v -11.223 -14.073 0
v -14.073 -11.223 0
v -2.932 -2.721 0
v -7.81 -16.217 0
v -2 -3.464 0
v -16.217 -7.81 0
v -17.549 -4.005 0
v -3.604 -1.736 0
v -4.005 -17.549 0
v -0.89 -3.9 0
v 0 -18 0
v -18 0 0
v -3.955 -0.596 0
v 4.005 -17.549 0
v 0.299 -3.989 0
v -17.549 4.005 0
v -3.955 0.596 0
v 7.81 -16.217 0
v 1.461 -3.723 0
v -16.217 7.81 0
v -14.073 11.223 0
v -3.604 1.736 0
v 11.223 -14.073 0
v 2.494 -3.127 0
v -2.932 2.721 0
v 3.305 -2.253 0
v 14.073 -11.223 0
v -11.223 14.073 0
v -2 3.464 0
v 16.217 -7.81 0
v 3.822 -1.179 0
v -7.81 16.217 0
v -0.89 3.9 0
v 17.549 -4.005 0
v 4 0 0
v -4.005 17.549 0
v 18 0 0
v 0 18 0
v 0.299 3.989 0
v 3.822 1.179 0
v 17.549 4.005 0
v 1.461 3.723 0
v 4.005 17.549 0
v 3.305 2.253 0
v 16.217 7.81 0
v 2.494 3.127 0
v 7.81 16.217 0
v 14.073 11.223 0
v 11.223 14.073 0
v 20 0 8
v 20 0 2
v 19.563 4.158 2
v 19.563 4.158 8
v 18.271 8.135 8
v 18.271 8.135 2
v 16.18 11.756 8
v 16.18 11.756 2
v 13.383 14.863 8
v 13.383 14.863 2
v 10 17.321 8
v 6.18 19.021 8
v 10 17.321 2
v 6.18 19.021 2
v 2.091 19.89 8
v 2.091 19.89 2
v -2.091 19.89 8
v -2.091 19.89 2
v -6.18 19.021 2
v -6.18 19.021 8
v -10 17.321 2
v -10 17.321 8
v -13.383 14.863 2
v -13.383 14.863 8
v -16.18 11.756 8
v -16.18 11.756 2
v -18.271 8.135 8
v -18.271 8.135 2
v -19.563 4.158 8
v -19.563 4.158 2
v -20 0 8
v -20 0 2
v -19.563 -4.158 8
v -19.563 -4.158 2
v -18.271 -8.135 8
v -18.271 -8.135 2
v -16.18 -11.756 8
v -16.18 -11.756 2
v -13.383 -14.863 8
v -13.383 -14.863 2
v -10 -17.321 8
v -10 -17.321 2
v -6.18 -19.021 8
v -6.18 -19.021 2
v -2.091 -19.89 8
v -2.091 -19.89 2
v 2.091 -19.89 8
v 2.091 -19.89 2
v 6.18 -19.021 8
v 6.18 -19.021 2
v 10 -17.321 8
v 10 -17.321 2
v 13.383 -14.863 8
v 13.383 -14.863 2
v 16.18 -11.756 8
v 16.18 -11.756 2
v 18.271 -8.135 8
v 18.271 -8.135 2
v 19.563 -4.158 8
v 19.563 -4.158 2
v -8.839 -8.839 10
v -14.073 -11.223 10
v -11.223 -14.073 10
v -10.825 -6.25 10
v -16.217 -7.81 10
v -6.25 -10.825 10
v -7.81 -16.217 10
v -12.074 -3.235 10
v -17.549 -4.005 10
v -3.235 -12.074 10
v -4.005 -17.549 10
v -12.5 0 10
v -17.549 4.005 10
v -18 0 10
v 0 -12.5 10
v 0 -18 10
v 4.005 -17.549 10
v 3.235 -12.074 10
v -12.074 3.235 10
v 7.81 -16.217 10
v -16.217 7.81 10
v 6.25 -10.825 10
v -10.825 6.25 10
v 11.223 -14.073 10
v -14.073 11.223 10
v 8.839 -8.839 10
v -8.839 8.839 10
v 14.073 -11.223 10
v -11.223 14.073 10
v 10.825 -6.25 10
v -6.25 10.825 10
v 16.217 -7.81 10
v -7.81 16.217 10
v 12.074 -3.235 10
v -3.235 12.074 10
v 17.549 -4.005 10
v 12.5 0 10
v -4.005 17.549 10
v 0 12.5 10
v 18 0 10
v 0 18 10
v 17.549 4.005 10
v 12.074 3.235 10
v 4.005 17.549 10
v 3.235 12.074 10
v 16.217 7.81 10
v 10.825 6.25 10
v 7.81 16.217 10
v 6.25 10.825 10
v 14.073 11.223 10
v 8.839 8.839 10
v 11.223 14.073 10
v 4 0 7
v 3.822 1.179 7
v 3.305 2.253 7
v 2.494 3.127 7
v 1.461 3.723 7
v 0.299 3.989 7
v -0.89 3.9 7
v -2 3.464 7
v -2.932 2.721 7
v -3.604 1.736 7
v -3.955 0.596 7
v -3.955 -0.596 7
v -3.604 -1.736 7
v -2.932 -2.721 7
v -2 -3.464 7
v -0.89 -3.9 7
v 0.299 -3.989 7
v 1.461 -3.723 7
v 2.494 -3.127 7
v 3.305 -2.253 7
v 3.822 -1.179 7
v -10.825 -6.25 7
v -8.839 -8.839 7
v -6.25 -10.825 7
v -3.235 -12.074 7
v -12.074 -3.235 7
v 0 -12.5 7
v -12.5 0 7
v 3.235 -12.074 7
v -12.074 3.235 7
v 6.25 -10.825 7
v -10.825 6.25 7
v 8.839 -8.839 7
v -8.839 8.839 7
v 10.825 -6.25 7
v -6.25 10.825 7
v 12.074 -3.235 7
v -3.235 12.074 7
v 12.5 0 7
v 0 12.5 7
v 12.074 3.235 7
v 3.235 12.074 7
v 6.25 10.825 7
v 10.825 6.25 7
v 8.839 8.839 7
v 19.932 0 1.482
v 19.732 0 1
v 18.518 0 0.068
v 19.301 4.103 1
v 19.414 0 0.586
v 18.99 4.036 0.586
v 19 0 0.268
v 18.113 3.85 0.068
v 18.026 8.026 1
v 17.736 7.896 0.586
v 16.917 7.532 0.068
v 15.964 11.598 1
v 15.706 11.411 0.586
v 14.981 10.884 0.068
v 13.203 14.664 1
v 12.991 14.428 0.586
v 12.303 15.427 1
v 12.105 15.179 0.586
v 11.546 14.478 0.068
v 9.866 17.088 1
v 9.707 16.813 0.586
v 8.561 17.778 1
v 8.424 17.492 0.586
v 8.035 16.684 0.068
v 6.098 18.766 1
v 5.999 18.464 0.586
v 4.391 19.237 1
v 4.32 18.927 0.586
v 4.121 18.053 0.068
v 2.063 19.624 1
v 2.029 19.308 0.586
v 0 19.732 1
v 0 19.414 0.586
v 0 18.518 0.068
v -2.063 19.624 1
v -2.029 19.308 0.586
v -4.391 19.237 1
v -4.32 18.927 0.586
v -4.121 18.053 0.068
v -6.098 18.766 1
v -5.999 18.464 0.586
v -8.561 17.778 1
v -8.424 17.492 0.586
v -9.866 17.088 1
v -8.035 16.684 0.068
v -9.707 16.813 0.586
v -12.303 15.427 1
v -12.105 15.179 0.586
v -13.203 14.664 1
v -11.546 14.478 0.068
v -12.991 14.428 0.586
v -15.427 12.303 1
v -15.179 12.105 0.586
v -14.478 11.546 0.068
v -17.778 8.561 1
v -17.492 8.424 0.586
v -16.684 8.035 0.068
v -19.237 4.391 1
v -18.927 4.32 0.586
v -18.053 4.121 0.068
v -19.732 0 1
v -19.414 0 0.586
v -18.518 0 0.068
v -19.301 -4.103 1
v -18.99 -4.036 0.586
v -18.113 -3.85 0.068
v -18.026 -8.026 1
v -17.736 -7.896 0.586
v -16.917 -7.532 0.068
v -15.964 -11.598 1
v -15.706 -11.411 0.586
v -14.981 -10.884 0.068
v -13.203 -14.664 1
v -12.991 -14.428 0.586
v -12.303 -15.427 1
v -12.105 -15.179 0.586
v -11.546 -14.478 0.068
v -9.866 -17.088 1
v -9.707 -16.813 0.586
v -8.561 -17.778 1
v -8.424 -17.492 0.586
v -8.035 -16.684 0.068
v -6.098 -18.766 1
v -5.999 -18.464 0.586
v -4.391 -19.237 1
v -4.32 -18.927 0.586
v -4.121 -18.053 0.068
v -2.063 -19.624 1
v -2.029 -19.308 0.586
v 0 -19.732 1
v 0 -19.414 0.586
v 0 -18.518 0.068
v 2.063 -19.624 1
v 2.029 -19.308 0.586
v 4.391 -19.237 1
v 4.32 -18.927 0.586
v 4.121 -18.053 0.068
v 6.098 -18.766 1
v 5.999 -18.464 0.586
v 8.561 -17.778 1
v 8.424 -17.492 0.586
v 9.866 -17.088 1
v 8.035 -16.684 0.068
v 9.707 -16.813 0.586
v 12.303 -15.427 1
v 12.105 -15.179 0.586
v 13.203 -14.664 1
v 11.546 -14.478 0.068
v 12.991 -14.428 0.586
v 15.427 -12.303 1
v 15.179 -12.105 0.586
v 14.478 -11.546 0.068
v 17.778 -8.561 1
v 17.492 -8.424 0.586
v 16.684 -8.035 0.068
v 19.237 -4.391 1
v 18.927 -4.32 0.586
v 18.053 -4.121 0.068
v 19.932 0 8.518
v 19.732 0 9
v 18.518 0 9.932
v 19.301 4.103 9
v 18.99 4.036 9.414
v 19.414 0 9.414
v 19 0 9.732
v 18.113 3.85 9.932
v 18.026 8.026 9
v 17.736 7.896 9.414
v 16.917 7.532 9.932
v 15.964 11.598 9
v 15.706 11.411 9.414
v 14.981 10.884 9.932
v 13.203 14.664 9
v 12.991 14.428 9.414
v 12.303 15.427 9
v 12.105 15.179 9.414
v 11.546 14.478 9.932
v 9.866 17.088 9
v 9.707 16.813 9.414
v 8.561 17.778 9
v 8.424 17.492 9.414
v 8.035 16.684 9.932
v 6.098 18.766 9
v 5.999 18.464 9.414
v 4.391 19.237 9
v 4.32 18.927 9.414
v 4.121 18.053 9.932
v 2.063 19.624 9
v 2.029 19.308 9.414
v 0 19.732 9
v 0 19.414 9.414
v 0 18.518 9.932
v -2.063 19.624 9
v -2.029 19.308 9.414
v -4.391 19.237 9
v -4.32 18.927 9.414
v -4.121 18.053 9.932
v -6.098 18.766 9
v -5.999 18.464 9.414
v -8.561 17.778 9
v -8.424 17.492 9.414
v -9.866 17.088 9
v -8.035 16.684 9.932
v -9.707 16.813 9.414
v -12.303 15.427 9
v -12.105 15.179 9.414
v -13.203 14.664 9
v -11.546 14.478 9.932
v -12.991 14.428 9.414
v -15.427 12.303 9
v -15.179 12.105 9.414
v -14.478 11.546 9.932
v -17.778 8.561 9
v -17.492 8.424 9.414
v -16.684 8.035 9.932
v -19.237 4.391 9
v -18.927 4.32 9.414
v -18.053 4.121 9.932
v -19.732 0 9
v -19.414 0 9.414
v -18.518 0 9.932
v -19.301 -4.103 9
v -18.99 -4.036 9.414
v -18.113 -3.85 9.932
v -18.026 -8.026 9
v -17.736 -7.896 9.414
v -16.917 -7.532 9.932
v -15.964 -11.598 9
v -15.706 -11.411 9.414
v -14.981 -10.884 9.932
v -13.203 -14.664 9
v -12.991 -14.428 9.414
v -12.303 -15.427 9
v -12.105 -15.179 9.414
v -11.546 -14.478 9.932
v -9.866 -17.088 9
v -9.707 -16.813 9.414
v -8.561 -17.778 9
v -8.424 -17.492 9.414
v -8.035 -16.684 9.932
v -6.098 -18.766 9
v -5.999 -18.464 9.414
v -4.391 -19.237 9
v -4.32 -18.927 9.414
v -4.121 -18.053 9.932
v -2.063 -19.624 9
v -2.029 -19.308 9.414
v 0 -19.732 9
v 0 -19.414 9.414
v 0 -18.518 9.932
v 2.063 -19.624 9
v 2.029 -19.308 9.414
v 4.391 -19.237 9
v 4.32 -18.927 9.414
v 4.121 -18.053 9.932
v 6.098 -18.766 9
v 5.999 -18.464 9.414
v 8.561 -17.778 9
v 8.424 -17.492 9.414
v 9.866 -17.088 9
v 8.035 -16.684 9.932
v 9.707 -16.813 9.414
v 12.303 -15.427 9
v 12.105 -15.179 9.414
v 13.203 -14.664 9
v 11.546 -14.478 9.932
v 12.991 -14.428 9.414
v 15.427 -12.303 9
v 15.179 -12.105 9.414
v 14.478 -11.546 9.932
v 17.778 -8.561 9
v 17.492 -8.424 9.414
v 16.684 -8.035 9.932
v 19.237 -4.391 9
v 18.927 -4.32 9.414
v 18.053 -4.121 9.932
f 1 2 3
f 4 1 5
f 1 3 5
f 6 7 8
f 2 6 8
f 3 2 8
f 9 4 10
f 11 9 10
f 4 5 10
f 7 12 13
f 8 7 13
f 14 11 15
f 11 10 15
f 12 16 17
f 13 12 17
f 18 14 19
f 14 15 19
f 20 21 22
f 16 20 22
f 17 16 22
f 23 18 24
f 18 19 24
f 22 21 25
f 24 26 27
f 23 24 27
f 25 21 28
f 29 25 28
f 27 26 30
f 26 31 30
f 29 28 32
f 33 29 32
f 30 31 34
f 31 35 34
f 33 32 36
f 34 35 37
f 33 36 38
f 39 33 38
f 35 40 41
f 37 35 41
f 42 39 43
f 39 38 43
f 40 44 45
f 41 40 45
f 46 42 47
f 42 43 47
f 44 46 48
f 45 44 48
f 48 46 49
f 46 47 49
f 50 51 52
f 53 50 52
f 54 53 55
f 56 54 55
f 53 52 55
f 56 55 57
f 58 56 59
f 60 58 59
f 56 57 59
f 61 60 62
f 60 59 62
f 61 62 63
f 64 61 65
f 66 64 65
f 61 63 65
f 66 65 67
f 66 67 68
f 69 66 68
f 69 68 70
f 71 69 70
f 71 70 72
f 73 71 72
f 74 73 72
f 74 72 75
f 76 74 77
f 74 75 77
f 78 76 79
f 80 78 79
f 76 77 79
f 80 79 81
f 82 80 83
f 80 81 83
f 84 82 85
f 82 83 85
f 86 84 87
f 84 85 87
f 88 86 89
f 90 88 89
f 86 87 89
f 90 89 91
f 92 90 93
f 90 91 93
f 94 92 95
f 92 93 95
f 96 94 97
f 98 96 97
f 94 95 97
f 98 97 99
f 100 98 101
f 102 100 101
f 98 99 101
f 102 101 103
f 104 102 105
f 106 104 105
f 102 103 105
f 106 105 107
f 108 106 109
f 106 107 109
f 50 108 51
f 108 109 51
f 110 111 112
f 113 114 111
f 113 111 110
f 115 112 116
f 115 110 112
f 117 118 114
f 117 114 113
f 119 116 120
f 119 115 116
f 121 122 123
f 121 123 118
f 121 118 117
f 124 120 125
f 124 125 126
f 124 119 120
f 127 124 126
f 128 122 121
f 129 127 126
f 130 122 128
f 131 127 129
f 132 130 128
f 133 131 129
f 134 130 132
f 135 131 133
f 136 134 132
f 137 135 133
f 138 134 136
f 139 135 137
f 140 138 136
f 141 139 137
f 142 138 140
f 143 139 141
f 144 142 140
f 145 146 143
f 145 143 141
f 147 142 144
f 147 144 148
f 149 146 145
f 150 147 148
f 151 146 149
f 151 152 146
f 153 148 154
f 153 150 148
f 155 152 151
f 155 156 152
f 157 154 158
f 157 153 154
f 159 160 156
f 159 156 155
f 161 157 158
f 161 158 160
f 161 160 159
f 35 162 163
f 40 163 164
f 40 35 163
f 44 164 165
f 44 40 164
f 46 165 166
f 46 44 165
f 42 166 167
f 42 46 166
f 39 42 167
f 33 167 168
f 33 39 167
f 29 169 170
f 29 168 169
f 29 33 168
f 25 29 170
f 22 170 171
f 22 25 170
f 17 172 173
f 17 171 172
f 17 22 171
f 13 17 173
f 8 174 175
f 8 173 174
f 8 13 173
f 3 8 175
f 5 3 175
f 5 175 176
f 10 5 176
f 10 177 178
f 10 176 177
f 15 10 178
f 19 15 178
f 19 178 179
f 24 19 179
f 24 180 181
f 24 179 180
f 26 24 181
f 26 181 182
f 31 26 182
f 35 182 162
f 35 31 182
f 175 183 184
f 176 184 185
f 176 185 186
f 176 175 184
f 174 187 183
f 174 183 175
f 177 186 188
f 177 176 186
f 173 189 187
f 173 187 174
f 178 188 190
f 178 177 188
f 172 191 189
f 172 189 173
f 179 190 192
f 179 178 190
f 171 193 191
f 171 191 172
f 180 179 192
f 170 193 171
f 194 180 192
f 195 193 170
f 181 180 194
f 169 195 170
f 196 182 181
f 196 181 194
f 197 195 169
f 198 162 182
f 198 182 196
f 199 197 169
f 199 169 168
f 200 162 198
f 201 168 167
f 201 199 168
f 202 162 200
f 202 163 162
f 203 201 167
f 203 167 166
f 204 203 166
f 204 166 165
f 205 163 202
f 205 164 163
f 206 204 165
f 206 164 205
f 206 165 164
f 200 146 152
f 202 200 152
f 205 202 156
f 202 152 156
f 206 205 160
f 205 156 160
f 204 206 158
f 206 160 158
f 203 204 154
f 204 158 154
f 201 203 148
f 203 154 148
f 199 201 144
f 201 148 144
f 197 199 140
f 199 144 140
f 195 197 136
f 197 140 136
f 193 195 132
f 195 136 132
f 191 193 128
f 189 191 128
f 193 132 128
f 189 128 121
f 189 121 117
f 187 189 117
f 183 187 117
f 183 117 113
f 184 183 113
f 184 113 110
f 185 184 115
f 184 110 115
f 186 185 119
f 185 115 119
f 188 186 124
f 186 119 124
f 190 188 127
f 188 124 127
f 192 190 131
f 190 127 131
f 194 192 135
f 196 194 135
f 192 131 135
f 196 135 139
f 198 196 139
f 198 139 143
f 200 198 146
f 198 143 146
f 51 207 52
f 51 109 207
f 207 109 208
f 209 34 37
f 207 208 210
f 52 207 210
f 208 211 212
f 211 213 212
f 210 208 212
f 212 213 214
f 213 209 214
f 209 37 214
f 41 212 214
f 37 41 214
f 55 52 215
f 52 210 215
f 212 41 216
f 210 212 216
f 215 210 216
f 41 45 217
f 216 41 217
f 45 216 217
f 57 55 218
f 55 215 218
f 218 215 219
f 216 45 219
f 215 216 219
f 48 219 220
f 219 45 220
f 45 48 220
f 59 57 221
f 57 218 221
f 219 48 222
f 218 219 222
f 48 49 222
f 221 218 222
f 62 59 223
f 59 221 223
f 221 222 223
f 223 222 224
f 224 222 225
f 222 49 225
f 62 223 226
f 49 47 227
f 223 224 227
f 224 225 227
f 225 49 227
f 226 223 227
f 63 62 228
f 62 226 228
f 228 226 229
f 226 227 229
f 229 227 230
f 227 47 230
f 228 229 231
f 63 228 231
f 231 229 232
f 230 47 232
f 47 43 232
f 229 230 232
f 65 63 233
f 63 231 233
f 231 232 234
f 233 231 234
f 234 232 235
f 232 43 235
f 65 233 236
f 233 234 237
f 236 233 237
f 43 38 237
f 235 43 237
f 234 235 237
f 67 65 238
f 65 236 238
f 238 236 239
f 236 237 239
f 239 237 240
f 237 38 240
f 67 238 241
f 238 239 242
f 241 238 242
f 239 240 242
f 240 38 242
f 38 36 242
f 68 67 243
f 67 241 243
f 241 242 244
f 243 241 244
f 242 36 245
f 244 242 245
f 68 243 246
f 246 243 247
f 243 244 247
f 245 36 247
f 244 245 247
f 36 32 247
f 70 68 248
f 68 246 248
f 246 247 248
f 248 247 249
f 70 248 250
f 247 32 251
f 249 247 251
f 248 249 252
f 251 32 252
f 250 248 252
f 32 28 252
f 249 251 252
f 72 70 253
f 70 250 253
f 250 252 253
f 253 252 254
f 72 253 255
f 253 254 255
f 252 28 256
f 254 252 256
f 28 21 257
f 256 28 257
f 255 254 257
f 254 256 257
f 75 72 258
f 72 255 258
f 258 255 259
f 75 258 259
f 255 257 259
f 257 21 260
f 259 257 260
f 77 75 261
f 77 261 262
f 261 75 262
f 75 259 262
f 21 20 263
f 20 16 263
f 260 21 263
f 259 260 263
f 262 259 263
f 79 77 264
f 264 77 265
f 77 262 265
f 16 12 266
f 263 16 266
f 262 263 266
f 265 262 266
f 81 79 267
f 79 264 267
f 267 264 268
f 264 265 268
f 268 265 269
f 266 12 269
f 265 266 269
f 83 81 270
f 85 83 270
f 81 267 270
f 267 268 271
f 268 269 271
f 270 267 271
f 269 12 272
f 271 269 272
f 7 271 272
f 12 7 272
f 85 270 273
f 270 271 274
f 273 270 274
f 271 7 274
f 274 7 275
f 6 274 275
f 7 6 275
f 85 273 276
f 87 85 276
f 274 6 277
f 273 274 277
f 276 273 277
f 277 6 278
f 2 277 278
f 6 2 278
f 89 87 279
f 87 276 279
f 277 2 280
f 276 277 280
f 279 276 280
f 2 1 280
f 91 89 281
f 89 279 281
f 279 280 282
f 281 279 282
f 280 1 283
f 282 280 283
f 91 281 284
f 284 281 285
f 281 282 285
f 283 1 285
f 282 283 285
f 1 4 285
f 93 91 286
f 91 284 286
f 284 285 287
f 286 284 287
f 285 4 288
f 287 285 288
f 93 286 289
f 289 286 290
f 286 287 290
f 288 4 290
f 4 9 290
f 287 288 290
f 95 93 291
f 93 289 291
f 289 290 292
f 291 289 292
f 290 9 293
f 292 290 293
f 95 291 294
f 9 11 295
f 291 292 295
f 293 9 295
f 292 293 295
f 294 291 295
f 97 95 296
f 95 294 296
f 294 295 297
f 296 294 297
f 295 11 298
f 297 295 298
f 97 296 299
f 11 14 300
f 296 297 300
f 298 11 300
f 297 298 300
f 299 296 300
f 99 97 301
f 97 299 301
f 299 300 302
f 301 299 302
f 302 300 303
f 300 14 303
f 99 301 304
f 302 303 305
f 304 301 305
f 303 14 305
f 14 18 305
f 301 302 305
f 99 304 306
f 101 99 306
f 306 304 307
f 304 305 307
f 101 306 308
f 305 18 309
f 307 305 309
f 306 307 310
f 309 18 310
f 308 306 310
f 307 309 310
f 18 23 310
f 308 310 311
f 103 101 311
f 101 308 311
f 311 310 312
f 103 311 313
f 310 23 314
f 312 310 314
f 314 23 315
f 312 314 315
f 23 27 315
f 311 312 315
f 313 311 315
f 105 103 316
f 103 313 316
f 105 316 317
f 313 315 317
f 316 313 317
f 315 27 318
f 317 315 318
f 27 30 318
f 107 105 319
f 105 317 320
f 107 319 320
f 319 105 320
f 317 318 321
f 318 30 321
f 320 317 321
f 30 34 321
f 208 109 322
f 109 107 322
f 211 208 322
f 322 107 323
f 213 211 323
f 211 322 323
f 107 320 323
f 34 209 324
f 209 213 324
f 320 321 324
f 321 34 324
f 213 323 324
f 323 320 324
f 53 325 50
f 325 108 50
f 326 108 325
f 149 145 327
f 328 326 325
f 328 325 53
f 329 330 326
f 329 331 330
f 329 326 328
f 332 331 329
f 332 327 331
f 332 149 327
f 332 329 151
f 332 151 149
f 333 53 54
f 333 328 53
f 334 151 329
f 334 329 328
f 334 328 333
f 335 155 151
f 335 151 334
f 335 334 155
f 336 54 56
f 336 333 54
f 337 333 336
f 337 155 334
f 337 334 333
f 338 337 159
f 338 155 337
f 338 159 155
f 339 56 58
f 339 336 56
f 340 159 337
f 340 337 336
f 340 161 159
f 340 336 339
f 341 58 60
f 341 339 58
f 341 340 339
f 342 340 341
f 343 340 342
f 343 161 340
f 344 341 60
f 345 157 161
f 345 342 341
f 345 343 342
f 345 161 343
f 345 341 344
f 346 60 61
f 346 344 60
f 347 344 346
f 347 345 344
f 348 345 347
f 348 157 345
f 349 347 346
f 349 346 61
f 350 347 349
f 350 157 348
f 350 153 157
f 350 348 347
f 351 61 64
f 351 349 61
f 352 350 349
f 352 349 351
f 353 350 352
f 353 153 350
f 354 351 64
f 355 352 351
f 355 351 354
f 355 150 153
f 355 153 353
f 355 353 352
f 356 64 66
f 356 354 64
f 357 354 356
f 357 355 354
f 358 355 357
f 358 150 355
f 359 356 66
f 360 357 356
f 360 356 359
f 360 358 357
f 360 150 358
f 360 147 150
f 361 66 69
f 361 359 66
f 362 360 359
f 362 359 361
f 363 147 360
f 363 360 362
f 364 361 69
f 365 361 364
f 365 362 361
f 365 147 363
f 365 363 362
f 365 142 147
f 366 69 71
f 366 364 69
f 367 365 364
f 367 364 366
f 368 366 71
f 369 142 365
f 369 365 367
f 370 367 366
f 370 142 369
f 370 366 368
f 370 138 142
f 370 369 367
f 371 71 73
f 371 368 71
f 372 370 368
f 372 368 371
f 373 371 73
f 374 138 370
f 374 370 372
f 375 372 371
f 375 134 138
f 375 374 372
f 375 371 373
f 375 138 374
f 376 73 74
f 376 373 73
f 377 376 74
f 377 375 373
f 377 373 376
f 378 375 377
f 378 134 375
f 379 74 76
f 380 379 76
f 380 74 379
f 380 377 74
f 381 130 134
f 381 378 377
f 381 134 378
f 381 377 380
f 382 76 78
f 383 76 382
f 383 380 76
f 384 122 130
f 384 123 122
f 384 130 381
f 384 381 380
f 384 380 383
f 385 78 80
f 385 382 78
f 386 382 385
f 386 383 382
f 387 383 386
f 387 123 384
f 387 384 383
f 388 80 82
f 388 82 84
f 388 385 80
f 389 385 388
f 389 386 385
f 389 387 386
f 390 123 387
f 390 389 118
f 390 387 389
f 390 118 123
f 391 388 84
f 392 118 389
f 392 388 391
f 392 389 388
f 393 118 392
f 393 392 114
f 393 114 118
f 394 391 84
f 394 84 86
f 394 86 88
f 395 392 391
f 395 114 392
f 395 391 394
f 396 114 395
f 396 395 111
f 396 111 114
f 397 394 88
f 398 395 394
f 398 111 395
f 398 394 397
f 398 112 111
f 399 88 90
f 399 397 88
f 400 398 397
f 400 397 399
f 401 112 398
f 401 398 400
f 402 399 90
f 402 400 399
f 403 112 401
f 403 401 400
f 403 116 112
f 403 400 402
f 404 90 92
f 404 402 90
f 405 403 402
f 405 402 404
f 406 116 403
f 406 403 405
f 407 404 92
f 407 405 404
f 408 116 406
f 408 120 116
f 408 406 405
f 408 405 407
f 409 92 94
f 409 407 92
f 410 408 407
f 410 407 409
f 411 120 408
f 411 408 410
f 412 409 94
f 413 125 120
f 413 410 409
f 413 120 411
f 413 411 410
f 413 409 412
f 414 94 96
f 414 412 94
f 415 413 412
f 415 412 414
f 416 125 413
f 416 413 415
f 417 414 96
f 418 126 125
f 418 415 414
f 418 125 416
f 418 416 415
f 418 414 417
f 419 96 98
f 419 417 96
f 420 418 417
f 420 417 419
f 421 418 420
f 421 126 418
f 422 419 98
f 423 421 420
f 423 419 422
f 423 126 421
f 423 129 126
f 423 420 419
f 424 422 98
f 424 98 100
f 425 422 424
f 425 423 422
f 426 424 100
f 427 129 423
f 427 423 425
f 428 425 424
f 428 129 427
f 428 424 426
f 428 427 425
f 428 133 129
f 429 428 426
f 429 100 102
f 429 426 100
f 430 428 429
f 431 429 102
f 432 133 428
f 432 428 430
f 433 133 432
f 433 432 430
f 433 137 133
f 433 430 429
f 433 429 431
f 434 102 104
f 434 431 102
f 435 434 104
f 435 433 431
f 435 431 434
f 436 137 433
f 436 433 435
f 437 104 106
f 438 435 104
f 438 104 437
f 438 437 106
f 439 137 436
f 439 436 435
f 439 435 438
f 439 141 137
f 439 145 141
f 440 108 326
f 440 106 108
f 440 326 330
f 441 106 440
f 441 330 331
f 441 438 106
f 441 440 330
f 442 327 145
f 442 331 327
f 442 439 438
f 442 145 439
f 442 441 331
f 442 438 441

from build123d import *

# Parameters (mm, degrees)
SKETCH1_R           = 20
SKETCH1_R_2         = 4
BOSS_EXTRUDE1_DEPTH = 10
SKETCH2_R           = 12.5
CUT_EXTRUDE1_DEPTH  = 3
FILLET1_R           = 2


with BuildPart() as part:
    # Sketch1 → Boss-Extrude1 (new body)
    with BuildSketch(Plane.XY):
        Circle(SKETCH1_R)
        Circle(SKETCH1_R_2, mode=Mode.SUBTRACT)
    extrude(amount=BOSS_EXTRUDE1_DEPTH)

    # Sketch2 → Cut-Extrude1 (cut)
    with BuildSketch(Plane.XY.offset(10)):
        Circle(SKETCH2_R)
    extrude(amount=-CUT_EXTRUDE1_DEPTH, mode=Mode.SUBTRACT)

    # Fillet1
    fillet1_edges = [part.edges().sort_by_distance(p)[0] for p in [
        (-20, 0, 0),
        (-20, 0, 10),
    ]]
    fillet(fillet1_edges, radius=FILLET1_R)


solid = part.part
